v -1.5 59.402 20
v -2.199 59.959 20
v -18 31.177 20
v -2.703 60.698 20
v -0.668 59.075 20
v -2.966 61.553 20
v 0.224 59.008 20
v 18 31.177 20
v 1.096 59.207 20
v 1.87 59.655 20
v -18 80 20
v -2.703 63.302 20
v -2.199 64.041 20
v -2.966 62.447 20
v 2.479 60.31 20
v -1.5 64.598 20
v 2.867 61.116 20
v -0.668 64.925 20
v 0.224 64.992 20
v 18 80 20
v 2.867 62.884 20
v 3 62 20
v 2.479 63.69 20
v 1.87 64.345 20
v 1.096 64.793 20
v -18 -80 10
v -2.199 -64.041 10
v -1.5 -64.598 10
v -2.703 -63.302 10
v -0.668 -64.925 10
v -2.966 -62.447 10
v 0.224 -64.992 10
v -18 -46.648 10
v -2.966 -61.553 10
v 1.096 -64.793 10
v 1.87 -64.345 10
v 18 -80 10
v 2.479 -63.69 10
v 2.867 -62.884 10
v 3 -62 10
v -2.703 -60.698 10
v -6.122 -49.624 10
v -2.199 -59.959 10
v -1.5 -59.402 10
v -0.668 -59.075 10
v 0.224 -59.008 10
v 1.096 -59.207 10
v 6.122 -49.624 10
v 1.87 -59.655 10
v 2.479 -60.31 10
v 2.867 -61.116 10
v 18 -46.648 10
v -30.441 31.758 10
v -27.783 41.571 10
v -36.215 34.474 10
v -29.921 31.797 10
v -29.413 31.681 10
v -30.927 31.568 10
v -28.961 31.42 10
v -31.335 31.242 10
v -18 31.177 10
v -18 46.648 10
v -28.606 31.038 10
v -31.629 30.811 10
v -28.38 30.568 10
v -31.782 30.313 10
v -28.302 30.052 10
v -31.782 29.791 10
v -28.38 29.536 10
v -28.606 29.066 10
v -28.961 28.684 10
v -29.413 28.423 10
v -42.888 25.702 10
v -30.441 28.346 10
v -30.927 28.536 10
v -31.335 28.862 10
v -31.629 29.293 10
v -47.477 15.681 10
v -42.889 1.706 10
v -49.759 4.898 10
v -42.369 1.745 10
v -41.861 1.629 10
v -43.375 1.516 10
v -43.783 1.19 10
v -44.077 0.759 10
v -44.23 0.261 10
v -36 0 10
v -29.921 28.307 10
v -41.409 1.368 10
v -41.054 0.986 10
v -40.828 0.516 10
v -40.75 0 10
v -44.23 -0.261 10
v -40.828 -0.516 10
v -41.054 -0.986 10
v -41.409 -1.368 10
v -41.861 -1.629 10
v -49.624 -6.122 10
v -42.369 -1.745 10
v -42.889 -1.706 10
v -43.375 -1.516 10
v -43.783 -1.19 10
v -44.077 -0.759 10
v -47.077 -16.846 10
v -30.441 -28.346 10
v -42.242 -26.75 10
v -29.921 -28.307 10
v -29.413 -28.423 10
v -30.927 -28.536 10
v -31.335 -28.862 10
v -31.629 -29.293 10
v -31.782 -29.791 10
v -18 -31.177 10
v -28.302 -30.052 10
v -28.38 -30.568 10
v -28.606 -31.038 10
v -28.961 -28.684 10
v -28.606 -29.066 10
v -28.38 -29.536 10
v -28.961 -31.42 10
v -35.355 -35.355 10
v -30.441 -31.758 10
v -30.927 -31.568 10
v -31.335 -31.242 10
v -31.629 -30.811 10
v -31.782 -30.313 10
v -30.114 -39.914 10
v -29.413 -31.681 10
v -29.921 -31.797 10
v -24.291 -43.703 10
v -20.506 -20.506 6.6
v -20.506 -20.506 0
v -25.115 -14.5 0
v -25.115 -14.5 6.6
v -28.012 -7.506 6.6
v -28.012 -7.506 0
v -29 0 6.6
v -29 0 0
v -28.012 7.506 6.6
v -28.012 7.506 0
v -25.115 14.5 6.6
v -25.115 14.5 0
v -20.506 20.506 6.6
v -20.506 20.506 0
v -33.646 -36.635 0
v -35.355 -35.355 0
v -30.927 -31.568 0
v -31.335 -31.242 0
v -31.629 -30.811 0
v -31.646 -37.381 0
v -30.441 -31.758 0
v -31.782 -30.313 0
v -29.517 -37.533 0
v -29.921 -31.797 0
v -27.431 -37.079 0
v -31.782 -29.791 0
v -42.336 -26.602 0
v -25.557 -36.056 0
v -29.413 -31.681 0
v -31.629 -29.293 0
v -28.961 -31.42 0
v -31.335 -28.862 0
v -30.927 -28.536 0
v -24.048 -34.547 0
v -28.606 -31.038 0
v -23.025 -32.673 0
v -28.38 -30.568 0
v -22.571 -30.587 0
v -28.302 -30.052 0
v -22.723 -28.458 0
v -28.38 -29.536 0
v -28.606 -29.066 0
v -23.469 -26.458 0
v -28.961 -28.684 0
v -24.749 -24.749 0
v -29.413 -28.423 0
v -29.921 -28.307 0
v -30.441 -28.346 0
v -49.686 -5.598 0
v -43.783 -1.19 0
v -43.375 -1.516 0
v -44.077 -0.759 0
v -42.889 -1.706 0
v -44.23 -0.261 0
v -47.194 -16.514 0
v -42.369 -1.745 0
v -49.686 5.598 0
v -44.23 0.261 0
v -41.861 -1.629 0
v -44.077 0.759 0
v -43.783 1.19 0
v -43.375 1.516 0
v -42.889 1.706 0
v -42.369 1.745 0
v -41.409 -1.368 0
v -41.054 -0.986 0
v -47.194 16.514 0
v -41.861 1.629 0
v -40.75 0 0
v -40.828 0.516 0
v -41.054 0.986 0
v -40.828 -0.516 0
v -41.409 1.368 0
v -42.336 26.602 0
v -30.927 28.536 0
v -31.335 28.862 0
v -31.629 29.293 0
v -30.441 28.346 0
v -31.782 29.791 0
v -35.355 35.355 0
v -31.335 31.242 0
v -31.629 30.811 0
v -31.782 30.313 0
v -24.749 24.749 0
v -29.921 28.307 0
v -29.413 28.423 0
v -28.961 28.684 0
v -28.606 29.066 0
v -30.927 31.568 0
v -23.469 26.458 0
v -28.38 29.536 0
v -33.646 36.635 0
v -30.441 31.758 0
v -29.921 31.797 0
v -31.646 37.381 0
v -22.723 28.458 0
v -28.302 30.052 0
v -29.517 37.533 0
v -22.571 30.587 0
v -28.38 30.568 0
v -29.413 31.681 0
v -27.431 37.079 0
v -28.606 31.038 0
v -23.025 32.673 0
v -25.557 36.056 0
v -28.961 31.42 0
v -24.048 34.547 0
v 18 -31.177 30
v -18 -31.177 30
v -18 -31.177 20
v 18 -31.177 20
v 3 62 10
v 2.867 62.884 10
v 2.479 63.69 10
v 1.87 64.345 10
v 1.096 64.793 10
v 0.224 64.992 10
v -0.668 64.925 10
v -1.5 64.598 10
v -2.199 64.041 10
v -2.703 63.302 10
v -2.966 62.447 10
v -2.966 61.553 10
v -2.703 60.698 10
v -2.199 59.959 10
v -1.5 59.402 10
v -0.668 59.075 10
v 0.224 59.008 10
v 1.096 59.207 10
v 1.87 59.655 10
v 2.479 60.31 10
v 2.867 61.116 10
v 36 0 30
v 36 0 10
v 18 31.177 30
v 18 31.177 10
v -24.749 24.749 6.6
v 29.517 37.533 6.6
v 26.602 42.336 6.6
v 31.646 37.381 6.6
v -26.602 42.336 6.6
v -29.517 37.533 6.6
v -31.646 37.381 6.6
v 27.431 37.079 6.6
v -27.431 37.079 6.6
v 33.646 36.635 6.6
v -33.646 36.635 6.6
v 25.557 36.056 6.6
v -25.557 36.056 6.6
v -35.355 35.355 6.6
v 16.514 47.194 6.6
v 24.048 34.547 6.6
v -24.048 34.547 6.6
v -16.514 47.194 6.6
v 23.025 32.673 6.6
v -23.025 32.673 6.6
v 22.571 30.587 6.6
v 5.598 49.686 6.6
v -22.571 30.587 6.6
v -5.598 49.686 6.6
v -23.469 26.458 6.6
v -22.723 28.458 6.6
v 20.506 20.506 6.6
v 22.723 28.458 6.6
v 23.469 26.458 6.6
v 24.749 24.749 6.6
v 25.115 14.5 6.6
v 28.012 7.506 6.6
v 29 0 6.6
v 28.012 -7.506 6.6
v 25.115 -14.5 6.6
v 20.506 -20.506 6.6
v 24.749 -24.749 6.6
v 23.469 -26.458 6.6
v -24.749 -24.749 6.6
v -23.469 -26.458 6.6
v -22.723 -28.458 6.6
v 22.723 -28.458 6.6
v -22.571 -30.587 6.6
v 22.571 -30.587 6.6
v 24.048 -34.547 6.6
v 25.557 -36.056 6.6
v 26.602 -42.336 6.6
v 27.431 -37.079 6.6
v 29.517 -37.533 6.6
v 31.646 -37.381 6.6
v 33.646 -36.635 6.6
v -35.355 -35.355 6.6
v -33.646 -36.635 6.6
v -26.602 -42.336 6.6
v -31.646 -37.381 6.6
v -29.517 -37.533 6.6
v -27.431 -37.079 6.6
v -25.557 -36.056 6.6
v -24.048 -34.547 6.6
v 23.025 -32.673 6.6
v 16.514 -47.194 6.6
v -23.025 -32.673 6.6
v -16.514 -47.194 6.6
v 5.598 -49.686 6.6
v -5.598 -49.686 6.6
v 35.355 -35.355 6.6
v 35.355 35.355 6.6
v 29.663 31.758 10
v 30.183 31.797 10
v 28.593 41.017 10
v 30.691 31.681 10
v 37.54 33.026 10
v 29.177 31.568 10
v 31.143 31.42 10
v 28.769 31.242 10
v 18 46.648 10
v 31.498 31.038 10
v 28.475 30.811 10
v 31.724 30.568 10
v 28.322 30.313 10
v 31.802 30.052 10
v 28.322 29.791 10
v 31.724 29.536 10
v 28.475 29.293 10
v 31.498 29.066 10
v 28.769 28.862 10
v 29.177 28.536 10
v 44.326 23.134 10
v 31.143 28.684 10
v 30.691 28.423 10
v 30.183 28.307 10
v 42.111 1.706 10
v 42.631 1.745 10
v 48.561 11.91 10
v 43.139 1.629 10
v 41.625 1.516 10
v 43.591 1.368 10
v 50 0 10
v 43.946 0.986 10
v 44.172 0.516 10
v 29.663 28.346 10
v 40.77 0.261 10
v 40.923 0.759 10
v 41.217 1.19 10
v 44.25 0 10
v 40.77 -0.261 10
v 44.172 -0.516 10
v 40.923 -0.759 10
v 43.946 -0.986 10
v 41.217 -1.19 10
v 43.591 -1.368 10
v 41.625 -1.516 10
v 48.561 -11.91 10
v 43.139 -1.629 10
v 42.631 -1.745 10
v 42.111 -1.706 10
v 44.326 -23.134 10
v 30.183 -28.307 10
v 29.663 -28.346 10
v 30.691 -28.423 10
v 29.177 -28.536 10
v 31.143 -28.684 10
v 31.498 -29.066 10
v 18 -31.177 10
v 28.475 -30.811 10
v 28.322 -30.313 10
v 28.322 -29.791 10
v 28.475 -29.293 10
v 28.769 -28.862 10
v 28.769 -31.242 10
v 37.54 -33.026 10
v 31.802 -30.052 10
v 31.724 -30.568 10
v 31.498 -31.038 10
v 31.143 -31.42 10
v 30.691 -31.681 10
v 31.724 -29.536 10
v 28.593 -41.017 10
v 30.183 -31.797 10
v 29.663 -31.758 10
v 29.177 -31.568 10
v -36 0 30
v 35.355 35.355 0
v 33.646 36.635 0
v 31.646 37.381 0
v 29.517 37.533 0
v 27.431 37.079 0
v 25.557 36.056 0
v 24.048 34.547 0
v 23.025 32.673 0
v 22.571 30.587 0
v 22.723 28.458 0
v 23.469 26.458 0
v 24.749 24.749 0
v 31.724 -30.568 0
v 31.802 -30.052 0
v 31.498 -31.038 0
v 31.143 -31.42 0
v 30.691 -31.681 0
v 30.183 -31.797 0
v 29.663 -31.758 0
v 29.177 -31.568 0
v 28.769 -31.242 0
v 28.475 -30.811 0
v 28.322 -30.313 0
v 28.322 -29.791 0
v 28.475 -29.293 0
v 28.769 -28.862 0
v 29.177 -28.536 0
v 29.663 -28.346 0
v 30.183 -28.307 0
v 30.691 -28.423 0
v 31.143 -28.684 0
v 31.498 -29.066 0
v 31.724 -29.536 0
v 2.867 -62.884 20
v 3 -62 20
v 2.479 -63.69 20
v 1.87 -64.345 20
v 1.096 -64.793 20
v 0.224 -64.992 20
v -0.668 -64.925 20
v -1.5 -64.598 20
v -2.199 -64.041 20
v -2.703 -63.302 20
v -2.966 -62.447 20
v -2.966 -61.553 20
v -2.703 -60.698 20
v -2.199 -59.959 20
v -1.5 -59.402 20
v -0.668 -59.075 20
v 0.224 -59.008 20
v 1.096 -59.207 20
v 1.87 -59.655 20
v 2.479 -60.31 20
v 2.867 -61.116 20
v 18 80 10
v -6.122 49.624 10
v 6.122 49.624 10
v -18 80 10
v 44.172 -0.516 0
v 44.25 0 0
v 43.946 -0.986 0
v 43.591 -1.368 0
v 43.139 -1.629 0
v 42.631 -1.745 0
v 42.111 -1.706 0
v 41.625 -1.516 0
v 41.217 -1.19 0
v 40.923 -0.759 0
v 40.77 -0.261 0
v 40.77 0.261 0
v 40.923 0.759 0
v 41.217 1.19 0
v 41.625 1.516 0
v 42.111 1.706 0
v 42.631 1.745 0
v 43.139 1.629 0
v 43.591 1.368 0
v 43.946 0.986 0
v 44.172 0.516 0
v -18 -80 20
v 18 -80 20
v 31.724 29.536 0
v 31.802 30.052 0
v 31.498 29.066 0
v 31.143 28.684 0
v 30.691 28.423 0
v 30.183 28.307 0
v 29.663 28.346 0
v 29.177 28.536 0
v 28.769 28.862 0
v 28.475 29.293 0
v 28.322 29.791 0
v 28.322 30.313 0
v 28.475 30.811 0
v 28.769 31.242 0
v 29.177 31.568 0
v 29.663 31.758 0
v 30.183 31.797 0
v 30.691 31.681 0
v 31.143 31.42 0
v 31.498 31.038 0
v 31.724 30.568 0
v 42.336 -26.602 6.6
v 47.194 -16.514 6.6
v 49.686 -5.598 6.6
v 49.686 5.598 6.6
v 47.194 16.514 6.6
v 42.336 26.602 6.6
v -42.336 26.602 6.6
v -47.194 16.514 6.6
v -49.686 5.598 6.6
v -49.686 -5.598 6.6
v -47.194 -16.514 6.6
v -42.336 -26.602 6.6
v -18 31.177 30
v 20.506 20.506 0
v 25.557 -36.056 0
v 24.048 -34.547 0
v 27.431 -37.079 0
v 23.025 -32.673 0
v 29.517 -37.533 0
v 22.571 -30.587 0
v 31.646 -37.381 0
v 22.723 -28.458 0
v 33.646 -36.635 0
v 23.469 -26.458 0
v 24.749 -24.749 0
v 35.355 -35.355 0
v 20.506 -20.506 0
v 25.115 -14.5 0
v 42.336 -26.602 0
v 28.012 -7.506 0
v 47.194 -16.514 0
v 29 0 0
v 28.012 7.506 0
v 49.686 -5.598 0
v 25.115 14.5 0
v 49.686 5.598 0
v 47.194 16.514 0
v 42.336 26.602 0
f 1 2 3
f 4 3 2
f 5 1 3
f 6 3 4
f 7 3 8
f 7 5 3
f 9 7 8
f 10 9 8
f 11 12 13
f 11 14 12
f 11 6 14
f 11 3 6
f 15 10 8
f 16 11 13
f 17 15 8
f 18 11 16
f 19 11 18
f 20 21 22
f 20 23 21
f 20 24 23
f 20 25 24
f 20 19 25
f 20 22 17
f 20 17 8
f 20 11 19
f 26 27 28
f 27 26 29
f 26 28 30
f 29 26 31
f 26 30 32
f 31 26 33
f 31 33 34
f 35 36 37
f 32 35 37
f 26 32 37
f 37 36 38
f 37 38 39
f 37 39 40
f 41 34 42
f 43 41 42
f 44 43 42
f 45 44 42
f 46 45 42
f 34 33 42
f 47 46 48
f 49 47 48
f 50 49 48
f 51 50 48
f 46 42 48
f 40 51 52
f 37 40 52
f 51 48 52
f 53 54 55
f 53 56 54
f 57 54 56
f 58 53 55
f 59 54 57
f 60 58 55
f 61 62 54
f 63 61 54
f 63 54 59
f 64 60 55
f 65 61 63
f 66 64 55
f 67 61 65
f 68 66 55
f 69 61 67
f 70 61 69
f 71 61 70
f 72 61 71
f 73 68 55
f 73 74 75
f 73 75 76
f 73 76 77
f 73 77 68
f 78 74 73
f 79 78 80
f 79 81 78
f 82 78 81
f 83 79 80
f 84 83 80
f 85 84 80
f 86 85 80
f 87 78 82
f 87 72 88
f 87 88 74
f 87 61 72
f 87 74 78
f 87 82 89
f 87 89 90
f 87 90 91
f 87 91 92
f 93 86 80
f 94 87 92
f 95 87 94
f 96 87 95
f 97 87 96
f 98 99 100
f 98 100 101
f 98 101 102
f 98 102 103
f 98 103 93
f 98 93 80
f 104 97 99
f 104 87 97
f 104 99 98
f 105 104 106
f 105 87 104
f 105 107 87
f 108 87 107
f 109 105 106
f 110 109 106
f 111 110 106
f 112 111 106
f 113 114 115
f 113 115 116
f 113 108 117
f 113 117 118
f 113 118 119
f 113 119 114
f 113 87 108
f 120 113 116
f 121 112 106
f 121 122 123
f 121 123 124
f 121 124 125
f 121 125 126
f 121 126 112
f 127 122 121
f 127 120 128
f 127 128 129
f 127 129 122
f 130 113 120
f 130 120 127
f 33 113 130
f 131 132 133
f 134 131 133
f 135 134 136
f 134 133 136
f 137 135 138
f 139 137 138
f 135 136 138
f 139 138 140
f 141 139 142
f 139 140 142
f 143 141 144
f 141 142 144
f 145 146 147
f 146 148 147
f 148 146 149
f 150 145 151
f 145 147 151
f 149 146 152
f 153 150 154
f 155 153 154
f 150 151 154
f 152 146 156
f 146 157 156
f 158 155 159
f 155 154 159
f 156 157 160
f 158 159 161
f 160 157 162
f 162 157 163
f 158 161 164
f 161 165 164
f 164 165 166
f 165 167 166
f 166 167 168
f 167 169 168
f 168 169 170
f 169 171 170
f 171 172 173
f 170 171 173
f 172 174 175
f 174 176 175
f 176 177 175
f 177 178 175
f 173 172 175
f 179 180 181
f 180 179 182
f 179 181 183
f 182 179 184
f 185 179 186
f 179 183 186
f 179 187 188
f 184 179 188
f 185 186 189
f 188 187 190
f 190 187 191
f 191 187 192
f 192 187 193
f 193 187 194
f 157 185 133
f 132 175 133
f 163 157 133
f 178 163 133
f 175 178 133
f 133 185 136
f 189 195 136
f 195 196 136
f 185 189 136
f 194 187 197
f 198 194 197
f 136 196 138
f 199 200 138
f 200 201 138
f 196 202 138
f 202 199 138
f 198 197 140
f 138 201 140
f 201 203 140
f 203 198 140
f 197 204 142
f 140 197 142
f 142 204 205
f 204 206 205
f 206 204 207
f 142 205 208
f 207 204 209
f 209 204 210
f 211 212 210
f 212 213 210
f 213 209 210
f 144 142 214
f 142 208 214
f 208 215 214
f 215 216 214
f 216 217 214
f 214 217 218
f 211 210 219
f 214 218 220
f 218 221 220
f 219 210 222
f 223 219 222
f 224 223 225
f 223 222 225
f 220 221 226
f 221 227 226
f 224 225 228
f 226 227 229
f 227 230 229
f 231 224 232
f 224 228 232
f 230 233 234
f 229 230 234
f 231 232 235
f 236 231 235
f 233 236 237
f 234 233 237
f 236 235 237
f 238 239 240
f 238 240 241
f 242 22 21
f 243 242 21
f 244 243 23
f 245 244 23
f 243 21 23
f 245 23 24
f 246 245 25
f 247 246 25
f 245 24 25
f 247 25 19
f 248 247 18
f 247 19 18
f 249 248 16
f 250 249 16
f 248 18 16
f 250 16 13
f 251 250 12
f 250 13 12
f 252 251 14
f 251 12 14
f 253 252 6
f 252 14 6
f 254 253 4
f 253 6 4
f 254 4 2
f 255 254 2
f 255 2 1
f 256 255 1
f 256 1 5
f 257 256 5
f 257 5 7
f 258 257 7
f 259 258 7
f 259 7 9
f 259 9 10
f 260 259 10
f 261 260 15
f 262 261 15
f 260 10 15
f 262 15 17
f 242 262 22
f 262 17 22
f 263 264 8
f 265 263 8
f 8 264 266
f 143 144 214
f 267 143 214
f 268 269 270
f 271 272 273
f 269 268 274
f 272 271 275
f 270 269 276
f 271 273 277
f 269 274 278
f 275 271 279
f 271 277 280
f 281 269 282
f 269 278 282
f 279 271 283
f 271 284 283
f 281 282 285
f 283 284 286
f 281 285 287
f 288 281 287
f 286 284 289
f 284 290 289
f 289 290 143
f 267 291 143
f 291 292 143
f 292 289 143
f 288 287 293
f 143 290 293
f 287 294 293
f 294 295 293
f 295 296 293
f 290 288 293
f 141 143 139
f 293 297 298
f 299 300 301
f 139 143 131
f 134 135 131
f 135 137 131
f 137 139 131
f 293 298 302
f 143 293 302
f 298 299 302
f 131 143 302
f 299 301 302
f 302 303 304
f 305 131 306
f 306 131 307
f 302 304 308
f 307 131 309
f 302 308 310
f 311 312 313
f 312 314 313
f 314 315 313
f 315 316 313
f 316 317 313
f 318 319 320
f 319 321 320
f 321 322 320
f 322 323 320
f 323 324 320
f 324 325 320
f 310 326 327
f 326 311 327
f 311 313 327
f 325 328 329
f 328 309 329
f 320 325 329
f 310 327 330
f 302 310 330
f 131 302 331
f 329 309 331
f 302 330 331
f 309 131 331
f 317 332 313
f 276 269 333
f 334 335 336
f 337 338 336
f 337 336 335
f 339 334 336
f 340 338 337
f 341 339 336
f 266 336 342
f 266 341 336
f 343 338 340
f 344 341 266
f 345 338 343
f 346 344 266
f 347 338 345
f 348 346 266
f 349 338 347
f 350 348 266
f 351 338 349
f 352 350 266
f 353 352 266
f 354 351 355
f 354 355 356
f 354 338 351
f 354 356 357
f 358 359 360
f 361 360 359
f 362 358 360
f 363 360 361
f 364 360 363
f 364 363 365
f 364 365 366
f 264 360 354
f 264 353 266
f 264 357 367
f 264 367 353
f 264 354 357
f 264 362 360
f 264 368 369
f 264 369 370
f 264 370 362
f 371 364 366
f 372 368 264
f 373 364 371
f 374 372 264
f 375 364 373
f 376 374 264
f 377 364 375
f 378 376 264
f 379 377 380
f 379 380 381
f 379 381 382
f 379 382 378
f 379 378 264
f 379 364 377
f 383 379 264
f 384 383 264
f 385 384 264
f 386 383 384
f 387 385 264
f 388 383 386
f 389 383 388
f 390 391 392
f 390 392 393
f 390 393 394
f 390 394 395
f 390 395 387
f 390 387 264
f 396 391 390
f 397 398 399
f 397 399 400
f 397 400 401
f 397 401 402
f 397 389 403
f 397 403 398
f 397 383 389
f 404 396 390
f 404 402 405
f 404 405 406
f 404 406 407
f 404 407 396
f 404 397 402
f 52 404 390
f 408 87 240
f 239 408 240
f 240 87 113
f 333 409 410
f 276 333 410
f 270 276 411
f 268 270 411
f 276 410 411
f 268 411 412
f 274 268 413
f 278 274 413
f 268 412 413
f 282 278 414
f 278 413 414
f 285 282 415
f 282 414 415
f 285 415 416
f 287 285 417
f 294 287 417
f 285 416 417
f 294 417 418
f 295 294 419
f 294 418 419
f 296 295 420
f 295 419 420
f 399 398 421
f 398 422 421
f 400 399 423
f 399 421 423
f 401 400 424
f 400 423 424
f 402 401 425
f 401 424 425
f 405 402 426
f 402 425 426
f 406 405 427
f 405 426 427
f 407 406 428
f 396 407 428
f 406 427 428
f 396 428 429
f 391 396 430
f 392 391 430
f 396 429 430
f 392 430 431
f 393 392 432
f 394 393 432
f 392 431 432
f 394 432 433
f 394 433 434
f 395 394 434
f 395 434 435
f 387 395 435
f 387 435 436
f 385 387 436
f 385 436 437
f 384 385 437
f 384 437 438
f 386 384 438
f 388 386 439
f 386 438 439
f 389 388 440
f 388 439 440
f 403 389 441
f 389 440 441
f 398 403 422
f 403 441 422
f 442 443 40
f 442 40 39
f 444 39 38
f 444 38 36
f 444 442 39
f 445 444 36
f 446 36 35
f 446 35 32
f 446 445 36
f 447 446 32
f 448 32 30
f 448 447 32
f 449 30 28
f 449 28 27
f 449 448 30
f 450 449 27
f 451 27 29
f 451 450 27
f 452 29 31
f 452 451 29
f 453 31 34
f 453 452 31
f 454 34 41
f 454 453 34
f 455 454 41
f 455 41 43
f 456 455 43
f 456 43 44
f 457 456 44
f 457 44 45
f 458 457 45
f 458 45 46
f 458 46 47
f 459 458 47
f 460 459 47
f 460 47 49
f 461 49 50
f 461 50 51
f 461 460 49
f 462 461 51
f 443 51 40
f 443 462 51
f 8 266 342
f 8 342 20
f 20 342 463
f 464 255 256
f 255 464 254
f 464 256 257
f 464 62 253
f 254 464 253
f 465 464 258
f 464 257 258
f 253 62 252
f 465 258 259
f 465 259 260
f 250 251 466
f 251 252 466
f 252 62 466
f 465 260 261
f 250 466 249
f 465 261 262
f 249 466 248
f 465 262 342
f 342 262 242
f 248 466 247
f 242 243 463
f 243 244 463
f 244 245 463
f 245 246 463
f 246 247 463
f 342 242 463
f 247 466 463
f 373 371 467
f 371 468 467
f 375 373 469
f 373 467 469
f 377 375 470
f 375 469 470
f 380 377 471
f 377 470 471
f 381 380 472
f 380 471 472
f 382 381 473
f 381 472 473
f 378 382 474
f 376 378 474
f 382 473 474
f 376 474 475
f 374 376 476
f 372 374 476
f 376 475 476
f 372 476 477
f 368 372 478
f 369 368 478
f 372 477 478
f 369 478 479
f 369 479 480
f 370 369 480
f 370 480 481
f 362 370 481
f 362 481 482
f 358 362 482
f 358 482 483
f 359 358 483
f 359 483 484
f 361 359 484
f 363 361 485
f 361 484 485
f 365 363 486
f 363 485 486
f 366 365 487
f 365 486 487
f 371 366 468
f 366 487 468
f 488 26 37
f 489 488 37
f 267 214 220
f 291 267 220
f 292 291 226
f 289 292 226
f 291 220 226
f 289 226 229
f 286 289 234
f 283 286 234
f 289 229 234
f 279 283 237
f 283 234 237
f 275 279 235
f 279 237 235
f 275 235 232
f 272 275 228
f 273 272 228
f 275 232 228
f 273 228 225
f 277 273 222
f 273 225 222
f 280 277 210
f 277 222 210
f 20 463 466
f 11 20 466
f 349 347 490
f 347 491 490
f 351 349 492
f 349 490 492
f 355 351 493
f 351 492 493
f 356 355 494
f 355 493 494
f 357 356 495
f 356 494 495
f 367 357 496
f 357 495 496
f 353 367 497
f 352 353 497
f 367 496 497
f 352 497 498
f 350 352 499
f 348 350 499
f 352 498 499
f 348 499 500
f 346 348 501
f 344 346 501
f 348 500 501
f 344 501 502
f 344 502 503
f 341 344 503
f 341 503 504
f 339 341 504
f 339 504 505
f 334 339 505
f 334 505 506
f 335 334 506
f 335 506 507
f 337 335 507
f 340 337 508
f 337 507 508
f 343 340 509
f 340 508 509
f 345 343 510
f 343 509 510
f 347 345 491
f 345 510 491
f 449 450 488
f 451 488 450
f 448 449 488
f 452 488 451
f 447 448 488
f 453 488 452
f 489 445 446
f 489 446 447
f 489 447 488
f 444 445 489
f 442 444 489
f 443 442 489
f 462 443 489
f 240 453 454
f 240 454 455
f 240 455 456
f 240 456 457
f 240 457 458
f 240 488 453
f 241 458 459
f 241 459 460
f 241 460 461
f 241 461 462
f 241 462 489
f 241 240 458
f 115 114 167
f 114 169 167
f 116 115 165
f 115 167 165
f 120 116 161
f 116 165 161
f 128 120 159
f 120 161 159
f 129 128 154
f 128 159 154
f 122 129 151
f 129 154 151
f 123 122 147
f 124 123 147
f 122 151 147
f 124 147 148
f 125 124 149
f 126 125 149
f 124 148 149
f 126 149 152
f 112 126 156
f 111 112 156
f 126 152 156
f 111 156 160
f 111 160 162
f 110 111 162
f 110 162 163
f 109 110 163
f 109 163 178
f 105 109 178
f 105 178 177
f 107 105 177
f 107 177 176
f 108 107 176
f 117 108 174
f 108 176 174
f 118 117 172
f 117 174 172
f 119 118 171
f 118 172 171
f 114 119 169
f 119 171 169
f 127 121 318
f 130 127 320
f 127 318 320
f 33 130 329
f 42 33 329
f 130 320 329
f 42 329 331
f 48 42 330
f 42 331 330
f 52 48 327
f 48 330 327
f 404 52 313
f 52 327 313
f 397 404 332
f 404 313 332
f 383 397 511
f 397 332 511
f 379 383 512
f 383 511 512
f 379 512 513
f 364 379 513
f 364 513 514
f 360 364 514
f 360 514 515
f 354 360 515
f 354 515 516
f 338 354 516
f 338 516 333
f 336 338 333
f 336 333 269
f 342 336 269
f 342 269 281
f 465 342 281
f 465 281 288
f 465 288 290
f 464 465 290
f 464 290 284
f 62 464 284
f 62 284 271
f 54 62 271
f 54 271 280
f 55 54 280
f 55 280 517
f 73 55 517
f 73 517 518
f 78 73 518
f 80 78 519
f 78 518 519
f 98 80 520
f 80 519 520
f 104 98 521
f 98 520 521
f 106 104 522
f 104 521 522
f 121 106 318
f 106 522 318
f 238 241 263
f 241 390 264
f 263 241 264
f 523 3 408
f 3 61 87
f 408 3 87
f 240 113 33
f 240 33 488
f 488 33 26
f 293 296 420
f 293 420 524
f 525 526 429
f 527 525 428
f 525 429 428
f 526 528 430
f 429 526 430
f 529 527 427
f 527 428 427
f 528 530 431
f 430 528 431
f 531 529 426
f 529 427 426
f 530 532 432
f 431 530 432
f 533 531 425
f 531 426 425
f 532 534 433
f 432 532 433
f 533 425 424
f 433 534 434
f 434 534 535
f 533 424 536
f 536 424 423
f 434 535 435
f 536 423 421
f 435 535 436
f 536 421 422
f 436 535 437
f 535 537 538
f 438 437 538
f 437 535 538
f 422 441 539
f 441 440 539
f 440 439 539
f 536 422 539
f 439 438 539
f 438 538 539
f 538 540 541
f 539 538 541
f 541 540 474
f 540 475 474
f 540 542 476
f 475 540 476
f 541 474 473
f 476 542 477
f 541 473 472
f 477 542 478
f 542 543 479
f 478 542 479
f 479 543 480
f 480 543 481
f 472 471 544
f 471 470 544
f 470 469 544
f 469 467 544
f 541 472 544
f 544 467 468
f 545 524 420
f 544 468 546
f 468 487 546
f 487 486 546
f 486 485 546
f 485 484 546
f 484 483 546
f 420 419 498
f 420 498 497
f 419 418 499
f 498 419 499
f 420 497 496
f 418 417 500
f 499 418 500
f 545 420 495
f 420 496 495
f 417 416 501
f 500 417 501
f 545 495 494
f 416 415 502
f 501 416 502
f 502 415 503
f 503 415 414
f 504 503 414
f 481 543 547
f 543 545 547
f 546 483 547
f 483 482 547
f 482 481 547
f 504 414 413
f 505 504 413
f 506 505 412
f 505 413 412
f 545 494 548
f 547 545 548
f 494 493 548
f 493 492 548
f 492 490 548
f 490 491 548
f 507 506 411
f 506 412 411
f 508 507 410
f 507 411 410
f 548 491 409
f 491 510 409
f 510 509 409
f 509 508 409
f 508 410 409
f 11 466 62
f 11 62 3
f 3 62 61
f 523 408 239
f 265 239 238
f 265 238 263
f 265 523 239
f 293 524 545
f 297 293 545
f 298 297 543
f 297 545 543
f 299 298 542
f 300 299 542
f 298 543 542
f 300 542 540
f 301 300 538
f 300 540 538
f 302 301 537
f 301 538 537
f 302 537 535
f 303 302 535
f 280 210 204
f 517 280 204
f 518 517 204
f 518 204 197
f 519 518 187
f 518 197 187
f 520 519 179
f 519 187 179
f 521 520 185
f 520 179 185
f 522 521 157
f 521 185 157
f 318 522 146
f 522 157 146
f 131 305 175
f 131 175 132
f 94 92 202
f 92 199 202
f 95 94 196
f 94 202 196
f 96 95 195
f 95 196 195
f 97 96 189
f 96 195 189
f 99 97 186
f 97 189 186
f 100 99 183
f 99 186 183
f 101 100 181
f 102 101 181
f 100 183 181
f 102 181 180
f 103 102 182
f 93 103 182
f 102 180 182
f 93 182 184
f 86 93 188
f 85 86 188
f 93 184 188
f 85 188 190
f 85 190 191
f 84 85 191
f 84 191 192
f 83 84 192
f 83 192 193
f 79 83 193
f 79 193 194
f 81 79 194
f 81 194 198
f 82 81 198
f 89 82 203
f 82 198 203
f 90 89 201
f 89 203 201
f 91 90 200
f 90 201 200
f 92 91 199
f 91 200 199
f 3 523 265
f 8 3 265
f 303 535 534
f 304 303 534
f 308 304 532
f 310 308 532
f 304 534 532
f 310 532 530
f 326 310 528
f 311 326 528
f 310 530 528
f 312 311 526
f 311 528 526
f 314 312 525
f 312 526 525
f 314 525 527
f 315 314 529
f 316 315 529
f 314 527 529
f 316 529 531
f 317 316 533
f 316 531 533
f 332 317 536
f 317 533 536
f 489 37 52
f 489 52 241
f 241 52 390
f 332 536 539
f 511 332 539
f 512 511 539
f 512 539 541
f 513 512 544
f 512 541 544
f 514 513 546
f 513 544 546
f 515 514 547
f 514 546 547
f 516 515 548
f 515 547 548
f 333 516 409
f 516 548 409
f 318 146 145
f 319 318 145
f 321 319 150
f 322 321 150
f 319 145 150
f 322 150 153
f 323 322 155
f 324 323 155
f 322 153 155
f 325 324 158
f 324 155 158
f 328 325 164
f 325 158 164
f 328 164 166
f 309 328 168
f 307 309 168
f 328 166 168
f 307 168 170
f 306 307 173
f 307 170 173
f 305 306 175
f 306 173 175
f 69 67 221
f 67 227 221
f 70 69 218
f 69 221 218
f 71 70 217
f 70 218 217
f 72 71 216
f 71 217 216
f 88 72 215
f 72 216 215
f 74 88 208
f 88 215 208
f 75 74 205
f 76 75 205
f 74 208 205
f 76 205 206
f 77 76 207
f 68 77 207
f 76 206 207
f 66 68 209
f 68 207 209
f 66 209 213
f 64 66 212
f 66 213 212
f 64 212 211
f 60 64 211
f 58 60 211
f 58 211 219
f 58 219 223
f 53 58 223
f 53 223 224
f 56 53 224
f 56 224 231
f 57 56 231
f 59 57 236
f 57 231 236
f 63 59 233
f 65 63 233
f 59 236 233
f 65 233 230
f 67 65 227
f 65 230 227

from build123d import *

# Parameters (mm, degrees)
SKETCH_1_R          = 1.75
EXTRUDE_1_DEPTH     = 6.6
EXTRUDE_1_2_DEPTH   = 6.6
SKETCH_2_R          = 50
EXTRUDE_2_DEPTH     = 3.4
SKETCH_4_R          = 1.75
CUT_EXTRUDE_2_DEPTH = 10
EXTRUDE_7_DEPTH     = 20
SKETCH_10_W         = 36
SKETCH_10_H         = 48.823085464
CUT_EXTRUDE_3_DEPTH = 10
SKETCH_11_R         = 3
CUT_EXTRUDE_6_DEPTH = 10


with BuildPart() as part:
    # 草图1 → 凸台-拉伸1 (new body)
    with BuildSketch(Plane.XY):
        with BuildLine():
            ThreePointArc((20.506096654, 20.506096654), (29, 0), (20.506096654, -20.506096654))
            Line((20.506096654, -20.506096654), (24.748737342, -24.748737342))
            ThreePointArc((24.748737342, -24.748737342), (24.748737342, -35.355339059), (35.355339059, -35.355339059))
            ThreePointArc((35.355339059, -35.355339059), (50, 0), (35.355339059, 35.355339059))
            ThreePointArc((35.355339059, 35.355339059), (24.748737342, 35.355339059), (24.748737342, 24.748737342))
            Line((24.748737342, 24.748737342), (20.506096654, 20.506096654))
        make_face()
        with Locations((30.0520382, 30.0520382)):
            Circle(SKETCH_1_R, mode=Mode.SUBTRACT)
        with Locations((30.0520382, -30.0520382)):
            Circle(SKETCH_1_R, mode=Mode.SUBTRACT)
        with Locations((42.5, 0)):
            Circle(SKETCH_1_R, mode=Mode.SUBTRACT)
    extrude(amount=EXTRUDE_1_DEPTH)



with BuildPart() as body_2:
    # 草图1 → Extrude 1 2 (new body)
    with BuildSketch(Plane.XY):
        with BuildLine():
            ThreePointArc((-35.355339059, 35.355339059), (-50, 0), (-35.355339059, -35.355339059))
            ThreePointArc((-35.355339059, -35.355339059), (-24.748737342, -35.355339059), (-24.748737342, -24.748737342))
            Line((-24.748737342, -24.748737342), (-20.506096654, -20.506096654))
            ThreePointArc((-20.506096654, -20.506096654), (-29, 0), (-20.506096654, 20.506096654))
            Line((-20.506096654, 20.506096654), (-24.748737342, 24.748737342))
            ThreePointArc((-24.748737342, 24.748737342), (-24.748737342, 35.355339059), (-35.355339059, 35.355339059))
        make_face()
        with Locations((-30.0520382, 30.0520382)):
            Circle(SKETCH_1_R, mode=Mode.SUBTRACT)
        with Locations((-30.0520382, -30.0520382)):
            Circle(SKETCH_1_R, mode=Mode.SUBTRACT)
        with Locations((-42.5, 0)):
            Circle(SKETCH_1_R, mode=Mode.SUBTRACT)
    extrude(amount=EXTRUDE_1_2_DEPTH)


with BuildPart() as part_1:
    add(part.part)

    add(body_2.part)  # 凸台-拉伸2 merges body 2
    # 草图2 → 凸台-拉伸2 (add)
    with BuildSketch(Plane.XY.offset(6.6)):
        with Locations(Location((0, 0, 0), (0, 0, 225))):
            Circle(SKETCH_2_R)
    extrude(amount=EXTRUDE_2_DEPTH)

    # 草图4 → 切除-拉伸2 (cut, symmetric)
    with BuildSketch(Plane(origin=(0, 0, 6.6), x_dir=(-1, 0, 0), z_dir=(0, 0, -1))):
        with Locations(Location((-42.5, 0, 0), (0, 0, 180))):
            Circle(SKETCH_4_R)
        with Locations(Location((-30.0520382, 30.0520382, 0), (0, 0, 180))):
            Circle(SKETCH_4_R)
        with Locations(Location((-30.0520382, -30.0520382, 0), (0, 0, 180))):
            Circle(SKETCH_4_R)
        with Locations(Location((30.0520382, -30.0520382, 0), (0, 0, 180))):
            Circle(SKETCH_4_R)
        with Locations(Location((42.5, 0, 0), (0, 0, 180))):
            Circle(SKETCH_4_R)
        with Locations(Location((30.0520382, 30.0520382, 0), (0, 0, 180))):
            Circle(SKETCH_4_R)
    extrude(amount=CUT_EXTRUDE_2_DEPTH, both=True, mode=Mode.SUBTRACT)

    # 草图5 → 凸台-拉伸7 (add)
    with BuildSketch(Plane.XY.offset(10)):
        Polygon((-18, -31.176914536), (-18, -80), (18, -80), (18, -31.176914536), (36, 0), (18, 31.176914536), (18, 80), (-18, 80), (-18, 31.176914536), (-36, 0), align=None)
    extrude(amount=EXTRUDE_7_DEPTH)

    # 草图10 → 切除-拉伸3 (cut)
    with BuildSketch(Plane.XY.offset(30)):
        with Locations((0, -55.588457268)):
            Rectangle(SKETCH_10_W, SKETCH_10_H)
        with Locations((0, 55.588457268)):
            Rectangle(SKETCH_10_W, SKETCH_10_H)
    extrude(amount=-CUT_EXTRUDE_3_DEPTH, mode=Mode.SUBTRACT)

    # 草图11 → 切除-拉伸6 (cut)
    with BuildSketch(Plane.XY.offset(20)):
        with Locations((0, 62)):
            Circle(SKETCH_11_R)
    cut_extrude_6 = extrude(amount=-CUT_EXTRUDE_6_DEPTH, mode=Mode.SUBTRACT)

    # 镜向2: 切除-拉伸6 across plane
    add(cut_extrude_6.mirror(Plane.ZX), mode=Mode.SUBTRACT)


solid = part_1.part
